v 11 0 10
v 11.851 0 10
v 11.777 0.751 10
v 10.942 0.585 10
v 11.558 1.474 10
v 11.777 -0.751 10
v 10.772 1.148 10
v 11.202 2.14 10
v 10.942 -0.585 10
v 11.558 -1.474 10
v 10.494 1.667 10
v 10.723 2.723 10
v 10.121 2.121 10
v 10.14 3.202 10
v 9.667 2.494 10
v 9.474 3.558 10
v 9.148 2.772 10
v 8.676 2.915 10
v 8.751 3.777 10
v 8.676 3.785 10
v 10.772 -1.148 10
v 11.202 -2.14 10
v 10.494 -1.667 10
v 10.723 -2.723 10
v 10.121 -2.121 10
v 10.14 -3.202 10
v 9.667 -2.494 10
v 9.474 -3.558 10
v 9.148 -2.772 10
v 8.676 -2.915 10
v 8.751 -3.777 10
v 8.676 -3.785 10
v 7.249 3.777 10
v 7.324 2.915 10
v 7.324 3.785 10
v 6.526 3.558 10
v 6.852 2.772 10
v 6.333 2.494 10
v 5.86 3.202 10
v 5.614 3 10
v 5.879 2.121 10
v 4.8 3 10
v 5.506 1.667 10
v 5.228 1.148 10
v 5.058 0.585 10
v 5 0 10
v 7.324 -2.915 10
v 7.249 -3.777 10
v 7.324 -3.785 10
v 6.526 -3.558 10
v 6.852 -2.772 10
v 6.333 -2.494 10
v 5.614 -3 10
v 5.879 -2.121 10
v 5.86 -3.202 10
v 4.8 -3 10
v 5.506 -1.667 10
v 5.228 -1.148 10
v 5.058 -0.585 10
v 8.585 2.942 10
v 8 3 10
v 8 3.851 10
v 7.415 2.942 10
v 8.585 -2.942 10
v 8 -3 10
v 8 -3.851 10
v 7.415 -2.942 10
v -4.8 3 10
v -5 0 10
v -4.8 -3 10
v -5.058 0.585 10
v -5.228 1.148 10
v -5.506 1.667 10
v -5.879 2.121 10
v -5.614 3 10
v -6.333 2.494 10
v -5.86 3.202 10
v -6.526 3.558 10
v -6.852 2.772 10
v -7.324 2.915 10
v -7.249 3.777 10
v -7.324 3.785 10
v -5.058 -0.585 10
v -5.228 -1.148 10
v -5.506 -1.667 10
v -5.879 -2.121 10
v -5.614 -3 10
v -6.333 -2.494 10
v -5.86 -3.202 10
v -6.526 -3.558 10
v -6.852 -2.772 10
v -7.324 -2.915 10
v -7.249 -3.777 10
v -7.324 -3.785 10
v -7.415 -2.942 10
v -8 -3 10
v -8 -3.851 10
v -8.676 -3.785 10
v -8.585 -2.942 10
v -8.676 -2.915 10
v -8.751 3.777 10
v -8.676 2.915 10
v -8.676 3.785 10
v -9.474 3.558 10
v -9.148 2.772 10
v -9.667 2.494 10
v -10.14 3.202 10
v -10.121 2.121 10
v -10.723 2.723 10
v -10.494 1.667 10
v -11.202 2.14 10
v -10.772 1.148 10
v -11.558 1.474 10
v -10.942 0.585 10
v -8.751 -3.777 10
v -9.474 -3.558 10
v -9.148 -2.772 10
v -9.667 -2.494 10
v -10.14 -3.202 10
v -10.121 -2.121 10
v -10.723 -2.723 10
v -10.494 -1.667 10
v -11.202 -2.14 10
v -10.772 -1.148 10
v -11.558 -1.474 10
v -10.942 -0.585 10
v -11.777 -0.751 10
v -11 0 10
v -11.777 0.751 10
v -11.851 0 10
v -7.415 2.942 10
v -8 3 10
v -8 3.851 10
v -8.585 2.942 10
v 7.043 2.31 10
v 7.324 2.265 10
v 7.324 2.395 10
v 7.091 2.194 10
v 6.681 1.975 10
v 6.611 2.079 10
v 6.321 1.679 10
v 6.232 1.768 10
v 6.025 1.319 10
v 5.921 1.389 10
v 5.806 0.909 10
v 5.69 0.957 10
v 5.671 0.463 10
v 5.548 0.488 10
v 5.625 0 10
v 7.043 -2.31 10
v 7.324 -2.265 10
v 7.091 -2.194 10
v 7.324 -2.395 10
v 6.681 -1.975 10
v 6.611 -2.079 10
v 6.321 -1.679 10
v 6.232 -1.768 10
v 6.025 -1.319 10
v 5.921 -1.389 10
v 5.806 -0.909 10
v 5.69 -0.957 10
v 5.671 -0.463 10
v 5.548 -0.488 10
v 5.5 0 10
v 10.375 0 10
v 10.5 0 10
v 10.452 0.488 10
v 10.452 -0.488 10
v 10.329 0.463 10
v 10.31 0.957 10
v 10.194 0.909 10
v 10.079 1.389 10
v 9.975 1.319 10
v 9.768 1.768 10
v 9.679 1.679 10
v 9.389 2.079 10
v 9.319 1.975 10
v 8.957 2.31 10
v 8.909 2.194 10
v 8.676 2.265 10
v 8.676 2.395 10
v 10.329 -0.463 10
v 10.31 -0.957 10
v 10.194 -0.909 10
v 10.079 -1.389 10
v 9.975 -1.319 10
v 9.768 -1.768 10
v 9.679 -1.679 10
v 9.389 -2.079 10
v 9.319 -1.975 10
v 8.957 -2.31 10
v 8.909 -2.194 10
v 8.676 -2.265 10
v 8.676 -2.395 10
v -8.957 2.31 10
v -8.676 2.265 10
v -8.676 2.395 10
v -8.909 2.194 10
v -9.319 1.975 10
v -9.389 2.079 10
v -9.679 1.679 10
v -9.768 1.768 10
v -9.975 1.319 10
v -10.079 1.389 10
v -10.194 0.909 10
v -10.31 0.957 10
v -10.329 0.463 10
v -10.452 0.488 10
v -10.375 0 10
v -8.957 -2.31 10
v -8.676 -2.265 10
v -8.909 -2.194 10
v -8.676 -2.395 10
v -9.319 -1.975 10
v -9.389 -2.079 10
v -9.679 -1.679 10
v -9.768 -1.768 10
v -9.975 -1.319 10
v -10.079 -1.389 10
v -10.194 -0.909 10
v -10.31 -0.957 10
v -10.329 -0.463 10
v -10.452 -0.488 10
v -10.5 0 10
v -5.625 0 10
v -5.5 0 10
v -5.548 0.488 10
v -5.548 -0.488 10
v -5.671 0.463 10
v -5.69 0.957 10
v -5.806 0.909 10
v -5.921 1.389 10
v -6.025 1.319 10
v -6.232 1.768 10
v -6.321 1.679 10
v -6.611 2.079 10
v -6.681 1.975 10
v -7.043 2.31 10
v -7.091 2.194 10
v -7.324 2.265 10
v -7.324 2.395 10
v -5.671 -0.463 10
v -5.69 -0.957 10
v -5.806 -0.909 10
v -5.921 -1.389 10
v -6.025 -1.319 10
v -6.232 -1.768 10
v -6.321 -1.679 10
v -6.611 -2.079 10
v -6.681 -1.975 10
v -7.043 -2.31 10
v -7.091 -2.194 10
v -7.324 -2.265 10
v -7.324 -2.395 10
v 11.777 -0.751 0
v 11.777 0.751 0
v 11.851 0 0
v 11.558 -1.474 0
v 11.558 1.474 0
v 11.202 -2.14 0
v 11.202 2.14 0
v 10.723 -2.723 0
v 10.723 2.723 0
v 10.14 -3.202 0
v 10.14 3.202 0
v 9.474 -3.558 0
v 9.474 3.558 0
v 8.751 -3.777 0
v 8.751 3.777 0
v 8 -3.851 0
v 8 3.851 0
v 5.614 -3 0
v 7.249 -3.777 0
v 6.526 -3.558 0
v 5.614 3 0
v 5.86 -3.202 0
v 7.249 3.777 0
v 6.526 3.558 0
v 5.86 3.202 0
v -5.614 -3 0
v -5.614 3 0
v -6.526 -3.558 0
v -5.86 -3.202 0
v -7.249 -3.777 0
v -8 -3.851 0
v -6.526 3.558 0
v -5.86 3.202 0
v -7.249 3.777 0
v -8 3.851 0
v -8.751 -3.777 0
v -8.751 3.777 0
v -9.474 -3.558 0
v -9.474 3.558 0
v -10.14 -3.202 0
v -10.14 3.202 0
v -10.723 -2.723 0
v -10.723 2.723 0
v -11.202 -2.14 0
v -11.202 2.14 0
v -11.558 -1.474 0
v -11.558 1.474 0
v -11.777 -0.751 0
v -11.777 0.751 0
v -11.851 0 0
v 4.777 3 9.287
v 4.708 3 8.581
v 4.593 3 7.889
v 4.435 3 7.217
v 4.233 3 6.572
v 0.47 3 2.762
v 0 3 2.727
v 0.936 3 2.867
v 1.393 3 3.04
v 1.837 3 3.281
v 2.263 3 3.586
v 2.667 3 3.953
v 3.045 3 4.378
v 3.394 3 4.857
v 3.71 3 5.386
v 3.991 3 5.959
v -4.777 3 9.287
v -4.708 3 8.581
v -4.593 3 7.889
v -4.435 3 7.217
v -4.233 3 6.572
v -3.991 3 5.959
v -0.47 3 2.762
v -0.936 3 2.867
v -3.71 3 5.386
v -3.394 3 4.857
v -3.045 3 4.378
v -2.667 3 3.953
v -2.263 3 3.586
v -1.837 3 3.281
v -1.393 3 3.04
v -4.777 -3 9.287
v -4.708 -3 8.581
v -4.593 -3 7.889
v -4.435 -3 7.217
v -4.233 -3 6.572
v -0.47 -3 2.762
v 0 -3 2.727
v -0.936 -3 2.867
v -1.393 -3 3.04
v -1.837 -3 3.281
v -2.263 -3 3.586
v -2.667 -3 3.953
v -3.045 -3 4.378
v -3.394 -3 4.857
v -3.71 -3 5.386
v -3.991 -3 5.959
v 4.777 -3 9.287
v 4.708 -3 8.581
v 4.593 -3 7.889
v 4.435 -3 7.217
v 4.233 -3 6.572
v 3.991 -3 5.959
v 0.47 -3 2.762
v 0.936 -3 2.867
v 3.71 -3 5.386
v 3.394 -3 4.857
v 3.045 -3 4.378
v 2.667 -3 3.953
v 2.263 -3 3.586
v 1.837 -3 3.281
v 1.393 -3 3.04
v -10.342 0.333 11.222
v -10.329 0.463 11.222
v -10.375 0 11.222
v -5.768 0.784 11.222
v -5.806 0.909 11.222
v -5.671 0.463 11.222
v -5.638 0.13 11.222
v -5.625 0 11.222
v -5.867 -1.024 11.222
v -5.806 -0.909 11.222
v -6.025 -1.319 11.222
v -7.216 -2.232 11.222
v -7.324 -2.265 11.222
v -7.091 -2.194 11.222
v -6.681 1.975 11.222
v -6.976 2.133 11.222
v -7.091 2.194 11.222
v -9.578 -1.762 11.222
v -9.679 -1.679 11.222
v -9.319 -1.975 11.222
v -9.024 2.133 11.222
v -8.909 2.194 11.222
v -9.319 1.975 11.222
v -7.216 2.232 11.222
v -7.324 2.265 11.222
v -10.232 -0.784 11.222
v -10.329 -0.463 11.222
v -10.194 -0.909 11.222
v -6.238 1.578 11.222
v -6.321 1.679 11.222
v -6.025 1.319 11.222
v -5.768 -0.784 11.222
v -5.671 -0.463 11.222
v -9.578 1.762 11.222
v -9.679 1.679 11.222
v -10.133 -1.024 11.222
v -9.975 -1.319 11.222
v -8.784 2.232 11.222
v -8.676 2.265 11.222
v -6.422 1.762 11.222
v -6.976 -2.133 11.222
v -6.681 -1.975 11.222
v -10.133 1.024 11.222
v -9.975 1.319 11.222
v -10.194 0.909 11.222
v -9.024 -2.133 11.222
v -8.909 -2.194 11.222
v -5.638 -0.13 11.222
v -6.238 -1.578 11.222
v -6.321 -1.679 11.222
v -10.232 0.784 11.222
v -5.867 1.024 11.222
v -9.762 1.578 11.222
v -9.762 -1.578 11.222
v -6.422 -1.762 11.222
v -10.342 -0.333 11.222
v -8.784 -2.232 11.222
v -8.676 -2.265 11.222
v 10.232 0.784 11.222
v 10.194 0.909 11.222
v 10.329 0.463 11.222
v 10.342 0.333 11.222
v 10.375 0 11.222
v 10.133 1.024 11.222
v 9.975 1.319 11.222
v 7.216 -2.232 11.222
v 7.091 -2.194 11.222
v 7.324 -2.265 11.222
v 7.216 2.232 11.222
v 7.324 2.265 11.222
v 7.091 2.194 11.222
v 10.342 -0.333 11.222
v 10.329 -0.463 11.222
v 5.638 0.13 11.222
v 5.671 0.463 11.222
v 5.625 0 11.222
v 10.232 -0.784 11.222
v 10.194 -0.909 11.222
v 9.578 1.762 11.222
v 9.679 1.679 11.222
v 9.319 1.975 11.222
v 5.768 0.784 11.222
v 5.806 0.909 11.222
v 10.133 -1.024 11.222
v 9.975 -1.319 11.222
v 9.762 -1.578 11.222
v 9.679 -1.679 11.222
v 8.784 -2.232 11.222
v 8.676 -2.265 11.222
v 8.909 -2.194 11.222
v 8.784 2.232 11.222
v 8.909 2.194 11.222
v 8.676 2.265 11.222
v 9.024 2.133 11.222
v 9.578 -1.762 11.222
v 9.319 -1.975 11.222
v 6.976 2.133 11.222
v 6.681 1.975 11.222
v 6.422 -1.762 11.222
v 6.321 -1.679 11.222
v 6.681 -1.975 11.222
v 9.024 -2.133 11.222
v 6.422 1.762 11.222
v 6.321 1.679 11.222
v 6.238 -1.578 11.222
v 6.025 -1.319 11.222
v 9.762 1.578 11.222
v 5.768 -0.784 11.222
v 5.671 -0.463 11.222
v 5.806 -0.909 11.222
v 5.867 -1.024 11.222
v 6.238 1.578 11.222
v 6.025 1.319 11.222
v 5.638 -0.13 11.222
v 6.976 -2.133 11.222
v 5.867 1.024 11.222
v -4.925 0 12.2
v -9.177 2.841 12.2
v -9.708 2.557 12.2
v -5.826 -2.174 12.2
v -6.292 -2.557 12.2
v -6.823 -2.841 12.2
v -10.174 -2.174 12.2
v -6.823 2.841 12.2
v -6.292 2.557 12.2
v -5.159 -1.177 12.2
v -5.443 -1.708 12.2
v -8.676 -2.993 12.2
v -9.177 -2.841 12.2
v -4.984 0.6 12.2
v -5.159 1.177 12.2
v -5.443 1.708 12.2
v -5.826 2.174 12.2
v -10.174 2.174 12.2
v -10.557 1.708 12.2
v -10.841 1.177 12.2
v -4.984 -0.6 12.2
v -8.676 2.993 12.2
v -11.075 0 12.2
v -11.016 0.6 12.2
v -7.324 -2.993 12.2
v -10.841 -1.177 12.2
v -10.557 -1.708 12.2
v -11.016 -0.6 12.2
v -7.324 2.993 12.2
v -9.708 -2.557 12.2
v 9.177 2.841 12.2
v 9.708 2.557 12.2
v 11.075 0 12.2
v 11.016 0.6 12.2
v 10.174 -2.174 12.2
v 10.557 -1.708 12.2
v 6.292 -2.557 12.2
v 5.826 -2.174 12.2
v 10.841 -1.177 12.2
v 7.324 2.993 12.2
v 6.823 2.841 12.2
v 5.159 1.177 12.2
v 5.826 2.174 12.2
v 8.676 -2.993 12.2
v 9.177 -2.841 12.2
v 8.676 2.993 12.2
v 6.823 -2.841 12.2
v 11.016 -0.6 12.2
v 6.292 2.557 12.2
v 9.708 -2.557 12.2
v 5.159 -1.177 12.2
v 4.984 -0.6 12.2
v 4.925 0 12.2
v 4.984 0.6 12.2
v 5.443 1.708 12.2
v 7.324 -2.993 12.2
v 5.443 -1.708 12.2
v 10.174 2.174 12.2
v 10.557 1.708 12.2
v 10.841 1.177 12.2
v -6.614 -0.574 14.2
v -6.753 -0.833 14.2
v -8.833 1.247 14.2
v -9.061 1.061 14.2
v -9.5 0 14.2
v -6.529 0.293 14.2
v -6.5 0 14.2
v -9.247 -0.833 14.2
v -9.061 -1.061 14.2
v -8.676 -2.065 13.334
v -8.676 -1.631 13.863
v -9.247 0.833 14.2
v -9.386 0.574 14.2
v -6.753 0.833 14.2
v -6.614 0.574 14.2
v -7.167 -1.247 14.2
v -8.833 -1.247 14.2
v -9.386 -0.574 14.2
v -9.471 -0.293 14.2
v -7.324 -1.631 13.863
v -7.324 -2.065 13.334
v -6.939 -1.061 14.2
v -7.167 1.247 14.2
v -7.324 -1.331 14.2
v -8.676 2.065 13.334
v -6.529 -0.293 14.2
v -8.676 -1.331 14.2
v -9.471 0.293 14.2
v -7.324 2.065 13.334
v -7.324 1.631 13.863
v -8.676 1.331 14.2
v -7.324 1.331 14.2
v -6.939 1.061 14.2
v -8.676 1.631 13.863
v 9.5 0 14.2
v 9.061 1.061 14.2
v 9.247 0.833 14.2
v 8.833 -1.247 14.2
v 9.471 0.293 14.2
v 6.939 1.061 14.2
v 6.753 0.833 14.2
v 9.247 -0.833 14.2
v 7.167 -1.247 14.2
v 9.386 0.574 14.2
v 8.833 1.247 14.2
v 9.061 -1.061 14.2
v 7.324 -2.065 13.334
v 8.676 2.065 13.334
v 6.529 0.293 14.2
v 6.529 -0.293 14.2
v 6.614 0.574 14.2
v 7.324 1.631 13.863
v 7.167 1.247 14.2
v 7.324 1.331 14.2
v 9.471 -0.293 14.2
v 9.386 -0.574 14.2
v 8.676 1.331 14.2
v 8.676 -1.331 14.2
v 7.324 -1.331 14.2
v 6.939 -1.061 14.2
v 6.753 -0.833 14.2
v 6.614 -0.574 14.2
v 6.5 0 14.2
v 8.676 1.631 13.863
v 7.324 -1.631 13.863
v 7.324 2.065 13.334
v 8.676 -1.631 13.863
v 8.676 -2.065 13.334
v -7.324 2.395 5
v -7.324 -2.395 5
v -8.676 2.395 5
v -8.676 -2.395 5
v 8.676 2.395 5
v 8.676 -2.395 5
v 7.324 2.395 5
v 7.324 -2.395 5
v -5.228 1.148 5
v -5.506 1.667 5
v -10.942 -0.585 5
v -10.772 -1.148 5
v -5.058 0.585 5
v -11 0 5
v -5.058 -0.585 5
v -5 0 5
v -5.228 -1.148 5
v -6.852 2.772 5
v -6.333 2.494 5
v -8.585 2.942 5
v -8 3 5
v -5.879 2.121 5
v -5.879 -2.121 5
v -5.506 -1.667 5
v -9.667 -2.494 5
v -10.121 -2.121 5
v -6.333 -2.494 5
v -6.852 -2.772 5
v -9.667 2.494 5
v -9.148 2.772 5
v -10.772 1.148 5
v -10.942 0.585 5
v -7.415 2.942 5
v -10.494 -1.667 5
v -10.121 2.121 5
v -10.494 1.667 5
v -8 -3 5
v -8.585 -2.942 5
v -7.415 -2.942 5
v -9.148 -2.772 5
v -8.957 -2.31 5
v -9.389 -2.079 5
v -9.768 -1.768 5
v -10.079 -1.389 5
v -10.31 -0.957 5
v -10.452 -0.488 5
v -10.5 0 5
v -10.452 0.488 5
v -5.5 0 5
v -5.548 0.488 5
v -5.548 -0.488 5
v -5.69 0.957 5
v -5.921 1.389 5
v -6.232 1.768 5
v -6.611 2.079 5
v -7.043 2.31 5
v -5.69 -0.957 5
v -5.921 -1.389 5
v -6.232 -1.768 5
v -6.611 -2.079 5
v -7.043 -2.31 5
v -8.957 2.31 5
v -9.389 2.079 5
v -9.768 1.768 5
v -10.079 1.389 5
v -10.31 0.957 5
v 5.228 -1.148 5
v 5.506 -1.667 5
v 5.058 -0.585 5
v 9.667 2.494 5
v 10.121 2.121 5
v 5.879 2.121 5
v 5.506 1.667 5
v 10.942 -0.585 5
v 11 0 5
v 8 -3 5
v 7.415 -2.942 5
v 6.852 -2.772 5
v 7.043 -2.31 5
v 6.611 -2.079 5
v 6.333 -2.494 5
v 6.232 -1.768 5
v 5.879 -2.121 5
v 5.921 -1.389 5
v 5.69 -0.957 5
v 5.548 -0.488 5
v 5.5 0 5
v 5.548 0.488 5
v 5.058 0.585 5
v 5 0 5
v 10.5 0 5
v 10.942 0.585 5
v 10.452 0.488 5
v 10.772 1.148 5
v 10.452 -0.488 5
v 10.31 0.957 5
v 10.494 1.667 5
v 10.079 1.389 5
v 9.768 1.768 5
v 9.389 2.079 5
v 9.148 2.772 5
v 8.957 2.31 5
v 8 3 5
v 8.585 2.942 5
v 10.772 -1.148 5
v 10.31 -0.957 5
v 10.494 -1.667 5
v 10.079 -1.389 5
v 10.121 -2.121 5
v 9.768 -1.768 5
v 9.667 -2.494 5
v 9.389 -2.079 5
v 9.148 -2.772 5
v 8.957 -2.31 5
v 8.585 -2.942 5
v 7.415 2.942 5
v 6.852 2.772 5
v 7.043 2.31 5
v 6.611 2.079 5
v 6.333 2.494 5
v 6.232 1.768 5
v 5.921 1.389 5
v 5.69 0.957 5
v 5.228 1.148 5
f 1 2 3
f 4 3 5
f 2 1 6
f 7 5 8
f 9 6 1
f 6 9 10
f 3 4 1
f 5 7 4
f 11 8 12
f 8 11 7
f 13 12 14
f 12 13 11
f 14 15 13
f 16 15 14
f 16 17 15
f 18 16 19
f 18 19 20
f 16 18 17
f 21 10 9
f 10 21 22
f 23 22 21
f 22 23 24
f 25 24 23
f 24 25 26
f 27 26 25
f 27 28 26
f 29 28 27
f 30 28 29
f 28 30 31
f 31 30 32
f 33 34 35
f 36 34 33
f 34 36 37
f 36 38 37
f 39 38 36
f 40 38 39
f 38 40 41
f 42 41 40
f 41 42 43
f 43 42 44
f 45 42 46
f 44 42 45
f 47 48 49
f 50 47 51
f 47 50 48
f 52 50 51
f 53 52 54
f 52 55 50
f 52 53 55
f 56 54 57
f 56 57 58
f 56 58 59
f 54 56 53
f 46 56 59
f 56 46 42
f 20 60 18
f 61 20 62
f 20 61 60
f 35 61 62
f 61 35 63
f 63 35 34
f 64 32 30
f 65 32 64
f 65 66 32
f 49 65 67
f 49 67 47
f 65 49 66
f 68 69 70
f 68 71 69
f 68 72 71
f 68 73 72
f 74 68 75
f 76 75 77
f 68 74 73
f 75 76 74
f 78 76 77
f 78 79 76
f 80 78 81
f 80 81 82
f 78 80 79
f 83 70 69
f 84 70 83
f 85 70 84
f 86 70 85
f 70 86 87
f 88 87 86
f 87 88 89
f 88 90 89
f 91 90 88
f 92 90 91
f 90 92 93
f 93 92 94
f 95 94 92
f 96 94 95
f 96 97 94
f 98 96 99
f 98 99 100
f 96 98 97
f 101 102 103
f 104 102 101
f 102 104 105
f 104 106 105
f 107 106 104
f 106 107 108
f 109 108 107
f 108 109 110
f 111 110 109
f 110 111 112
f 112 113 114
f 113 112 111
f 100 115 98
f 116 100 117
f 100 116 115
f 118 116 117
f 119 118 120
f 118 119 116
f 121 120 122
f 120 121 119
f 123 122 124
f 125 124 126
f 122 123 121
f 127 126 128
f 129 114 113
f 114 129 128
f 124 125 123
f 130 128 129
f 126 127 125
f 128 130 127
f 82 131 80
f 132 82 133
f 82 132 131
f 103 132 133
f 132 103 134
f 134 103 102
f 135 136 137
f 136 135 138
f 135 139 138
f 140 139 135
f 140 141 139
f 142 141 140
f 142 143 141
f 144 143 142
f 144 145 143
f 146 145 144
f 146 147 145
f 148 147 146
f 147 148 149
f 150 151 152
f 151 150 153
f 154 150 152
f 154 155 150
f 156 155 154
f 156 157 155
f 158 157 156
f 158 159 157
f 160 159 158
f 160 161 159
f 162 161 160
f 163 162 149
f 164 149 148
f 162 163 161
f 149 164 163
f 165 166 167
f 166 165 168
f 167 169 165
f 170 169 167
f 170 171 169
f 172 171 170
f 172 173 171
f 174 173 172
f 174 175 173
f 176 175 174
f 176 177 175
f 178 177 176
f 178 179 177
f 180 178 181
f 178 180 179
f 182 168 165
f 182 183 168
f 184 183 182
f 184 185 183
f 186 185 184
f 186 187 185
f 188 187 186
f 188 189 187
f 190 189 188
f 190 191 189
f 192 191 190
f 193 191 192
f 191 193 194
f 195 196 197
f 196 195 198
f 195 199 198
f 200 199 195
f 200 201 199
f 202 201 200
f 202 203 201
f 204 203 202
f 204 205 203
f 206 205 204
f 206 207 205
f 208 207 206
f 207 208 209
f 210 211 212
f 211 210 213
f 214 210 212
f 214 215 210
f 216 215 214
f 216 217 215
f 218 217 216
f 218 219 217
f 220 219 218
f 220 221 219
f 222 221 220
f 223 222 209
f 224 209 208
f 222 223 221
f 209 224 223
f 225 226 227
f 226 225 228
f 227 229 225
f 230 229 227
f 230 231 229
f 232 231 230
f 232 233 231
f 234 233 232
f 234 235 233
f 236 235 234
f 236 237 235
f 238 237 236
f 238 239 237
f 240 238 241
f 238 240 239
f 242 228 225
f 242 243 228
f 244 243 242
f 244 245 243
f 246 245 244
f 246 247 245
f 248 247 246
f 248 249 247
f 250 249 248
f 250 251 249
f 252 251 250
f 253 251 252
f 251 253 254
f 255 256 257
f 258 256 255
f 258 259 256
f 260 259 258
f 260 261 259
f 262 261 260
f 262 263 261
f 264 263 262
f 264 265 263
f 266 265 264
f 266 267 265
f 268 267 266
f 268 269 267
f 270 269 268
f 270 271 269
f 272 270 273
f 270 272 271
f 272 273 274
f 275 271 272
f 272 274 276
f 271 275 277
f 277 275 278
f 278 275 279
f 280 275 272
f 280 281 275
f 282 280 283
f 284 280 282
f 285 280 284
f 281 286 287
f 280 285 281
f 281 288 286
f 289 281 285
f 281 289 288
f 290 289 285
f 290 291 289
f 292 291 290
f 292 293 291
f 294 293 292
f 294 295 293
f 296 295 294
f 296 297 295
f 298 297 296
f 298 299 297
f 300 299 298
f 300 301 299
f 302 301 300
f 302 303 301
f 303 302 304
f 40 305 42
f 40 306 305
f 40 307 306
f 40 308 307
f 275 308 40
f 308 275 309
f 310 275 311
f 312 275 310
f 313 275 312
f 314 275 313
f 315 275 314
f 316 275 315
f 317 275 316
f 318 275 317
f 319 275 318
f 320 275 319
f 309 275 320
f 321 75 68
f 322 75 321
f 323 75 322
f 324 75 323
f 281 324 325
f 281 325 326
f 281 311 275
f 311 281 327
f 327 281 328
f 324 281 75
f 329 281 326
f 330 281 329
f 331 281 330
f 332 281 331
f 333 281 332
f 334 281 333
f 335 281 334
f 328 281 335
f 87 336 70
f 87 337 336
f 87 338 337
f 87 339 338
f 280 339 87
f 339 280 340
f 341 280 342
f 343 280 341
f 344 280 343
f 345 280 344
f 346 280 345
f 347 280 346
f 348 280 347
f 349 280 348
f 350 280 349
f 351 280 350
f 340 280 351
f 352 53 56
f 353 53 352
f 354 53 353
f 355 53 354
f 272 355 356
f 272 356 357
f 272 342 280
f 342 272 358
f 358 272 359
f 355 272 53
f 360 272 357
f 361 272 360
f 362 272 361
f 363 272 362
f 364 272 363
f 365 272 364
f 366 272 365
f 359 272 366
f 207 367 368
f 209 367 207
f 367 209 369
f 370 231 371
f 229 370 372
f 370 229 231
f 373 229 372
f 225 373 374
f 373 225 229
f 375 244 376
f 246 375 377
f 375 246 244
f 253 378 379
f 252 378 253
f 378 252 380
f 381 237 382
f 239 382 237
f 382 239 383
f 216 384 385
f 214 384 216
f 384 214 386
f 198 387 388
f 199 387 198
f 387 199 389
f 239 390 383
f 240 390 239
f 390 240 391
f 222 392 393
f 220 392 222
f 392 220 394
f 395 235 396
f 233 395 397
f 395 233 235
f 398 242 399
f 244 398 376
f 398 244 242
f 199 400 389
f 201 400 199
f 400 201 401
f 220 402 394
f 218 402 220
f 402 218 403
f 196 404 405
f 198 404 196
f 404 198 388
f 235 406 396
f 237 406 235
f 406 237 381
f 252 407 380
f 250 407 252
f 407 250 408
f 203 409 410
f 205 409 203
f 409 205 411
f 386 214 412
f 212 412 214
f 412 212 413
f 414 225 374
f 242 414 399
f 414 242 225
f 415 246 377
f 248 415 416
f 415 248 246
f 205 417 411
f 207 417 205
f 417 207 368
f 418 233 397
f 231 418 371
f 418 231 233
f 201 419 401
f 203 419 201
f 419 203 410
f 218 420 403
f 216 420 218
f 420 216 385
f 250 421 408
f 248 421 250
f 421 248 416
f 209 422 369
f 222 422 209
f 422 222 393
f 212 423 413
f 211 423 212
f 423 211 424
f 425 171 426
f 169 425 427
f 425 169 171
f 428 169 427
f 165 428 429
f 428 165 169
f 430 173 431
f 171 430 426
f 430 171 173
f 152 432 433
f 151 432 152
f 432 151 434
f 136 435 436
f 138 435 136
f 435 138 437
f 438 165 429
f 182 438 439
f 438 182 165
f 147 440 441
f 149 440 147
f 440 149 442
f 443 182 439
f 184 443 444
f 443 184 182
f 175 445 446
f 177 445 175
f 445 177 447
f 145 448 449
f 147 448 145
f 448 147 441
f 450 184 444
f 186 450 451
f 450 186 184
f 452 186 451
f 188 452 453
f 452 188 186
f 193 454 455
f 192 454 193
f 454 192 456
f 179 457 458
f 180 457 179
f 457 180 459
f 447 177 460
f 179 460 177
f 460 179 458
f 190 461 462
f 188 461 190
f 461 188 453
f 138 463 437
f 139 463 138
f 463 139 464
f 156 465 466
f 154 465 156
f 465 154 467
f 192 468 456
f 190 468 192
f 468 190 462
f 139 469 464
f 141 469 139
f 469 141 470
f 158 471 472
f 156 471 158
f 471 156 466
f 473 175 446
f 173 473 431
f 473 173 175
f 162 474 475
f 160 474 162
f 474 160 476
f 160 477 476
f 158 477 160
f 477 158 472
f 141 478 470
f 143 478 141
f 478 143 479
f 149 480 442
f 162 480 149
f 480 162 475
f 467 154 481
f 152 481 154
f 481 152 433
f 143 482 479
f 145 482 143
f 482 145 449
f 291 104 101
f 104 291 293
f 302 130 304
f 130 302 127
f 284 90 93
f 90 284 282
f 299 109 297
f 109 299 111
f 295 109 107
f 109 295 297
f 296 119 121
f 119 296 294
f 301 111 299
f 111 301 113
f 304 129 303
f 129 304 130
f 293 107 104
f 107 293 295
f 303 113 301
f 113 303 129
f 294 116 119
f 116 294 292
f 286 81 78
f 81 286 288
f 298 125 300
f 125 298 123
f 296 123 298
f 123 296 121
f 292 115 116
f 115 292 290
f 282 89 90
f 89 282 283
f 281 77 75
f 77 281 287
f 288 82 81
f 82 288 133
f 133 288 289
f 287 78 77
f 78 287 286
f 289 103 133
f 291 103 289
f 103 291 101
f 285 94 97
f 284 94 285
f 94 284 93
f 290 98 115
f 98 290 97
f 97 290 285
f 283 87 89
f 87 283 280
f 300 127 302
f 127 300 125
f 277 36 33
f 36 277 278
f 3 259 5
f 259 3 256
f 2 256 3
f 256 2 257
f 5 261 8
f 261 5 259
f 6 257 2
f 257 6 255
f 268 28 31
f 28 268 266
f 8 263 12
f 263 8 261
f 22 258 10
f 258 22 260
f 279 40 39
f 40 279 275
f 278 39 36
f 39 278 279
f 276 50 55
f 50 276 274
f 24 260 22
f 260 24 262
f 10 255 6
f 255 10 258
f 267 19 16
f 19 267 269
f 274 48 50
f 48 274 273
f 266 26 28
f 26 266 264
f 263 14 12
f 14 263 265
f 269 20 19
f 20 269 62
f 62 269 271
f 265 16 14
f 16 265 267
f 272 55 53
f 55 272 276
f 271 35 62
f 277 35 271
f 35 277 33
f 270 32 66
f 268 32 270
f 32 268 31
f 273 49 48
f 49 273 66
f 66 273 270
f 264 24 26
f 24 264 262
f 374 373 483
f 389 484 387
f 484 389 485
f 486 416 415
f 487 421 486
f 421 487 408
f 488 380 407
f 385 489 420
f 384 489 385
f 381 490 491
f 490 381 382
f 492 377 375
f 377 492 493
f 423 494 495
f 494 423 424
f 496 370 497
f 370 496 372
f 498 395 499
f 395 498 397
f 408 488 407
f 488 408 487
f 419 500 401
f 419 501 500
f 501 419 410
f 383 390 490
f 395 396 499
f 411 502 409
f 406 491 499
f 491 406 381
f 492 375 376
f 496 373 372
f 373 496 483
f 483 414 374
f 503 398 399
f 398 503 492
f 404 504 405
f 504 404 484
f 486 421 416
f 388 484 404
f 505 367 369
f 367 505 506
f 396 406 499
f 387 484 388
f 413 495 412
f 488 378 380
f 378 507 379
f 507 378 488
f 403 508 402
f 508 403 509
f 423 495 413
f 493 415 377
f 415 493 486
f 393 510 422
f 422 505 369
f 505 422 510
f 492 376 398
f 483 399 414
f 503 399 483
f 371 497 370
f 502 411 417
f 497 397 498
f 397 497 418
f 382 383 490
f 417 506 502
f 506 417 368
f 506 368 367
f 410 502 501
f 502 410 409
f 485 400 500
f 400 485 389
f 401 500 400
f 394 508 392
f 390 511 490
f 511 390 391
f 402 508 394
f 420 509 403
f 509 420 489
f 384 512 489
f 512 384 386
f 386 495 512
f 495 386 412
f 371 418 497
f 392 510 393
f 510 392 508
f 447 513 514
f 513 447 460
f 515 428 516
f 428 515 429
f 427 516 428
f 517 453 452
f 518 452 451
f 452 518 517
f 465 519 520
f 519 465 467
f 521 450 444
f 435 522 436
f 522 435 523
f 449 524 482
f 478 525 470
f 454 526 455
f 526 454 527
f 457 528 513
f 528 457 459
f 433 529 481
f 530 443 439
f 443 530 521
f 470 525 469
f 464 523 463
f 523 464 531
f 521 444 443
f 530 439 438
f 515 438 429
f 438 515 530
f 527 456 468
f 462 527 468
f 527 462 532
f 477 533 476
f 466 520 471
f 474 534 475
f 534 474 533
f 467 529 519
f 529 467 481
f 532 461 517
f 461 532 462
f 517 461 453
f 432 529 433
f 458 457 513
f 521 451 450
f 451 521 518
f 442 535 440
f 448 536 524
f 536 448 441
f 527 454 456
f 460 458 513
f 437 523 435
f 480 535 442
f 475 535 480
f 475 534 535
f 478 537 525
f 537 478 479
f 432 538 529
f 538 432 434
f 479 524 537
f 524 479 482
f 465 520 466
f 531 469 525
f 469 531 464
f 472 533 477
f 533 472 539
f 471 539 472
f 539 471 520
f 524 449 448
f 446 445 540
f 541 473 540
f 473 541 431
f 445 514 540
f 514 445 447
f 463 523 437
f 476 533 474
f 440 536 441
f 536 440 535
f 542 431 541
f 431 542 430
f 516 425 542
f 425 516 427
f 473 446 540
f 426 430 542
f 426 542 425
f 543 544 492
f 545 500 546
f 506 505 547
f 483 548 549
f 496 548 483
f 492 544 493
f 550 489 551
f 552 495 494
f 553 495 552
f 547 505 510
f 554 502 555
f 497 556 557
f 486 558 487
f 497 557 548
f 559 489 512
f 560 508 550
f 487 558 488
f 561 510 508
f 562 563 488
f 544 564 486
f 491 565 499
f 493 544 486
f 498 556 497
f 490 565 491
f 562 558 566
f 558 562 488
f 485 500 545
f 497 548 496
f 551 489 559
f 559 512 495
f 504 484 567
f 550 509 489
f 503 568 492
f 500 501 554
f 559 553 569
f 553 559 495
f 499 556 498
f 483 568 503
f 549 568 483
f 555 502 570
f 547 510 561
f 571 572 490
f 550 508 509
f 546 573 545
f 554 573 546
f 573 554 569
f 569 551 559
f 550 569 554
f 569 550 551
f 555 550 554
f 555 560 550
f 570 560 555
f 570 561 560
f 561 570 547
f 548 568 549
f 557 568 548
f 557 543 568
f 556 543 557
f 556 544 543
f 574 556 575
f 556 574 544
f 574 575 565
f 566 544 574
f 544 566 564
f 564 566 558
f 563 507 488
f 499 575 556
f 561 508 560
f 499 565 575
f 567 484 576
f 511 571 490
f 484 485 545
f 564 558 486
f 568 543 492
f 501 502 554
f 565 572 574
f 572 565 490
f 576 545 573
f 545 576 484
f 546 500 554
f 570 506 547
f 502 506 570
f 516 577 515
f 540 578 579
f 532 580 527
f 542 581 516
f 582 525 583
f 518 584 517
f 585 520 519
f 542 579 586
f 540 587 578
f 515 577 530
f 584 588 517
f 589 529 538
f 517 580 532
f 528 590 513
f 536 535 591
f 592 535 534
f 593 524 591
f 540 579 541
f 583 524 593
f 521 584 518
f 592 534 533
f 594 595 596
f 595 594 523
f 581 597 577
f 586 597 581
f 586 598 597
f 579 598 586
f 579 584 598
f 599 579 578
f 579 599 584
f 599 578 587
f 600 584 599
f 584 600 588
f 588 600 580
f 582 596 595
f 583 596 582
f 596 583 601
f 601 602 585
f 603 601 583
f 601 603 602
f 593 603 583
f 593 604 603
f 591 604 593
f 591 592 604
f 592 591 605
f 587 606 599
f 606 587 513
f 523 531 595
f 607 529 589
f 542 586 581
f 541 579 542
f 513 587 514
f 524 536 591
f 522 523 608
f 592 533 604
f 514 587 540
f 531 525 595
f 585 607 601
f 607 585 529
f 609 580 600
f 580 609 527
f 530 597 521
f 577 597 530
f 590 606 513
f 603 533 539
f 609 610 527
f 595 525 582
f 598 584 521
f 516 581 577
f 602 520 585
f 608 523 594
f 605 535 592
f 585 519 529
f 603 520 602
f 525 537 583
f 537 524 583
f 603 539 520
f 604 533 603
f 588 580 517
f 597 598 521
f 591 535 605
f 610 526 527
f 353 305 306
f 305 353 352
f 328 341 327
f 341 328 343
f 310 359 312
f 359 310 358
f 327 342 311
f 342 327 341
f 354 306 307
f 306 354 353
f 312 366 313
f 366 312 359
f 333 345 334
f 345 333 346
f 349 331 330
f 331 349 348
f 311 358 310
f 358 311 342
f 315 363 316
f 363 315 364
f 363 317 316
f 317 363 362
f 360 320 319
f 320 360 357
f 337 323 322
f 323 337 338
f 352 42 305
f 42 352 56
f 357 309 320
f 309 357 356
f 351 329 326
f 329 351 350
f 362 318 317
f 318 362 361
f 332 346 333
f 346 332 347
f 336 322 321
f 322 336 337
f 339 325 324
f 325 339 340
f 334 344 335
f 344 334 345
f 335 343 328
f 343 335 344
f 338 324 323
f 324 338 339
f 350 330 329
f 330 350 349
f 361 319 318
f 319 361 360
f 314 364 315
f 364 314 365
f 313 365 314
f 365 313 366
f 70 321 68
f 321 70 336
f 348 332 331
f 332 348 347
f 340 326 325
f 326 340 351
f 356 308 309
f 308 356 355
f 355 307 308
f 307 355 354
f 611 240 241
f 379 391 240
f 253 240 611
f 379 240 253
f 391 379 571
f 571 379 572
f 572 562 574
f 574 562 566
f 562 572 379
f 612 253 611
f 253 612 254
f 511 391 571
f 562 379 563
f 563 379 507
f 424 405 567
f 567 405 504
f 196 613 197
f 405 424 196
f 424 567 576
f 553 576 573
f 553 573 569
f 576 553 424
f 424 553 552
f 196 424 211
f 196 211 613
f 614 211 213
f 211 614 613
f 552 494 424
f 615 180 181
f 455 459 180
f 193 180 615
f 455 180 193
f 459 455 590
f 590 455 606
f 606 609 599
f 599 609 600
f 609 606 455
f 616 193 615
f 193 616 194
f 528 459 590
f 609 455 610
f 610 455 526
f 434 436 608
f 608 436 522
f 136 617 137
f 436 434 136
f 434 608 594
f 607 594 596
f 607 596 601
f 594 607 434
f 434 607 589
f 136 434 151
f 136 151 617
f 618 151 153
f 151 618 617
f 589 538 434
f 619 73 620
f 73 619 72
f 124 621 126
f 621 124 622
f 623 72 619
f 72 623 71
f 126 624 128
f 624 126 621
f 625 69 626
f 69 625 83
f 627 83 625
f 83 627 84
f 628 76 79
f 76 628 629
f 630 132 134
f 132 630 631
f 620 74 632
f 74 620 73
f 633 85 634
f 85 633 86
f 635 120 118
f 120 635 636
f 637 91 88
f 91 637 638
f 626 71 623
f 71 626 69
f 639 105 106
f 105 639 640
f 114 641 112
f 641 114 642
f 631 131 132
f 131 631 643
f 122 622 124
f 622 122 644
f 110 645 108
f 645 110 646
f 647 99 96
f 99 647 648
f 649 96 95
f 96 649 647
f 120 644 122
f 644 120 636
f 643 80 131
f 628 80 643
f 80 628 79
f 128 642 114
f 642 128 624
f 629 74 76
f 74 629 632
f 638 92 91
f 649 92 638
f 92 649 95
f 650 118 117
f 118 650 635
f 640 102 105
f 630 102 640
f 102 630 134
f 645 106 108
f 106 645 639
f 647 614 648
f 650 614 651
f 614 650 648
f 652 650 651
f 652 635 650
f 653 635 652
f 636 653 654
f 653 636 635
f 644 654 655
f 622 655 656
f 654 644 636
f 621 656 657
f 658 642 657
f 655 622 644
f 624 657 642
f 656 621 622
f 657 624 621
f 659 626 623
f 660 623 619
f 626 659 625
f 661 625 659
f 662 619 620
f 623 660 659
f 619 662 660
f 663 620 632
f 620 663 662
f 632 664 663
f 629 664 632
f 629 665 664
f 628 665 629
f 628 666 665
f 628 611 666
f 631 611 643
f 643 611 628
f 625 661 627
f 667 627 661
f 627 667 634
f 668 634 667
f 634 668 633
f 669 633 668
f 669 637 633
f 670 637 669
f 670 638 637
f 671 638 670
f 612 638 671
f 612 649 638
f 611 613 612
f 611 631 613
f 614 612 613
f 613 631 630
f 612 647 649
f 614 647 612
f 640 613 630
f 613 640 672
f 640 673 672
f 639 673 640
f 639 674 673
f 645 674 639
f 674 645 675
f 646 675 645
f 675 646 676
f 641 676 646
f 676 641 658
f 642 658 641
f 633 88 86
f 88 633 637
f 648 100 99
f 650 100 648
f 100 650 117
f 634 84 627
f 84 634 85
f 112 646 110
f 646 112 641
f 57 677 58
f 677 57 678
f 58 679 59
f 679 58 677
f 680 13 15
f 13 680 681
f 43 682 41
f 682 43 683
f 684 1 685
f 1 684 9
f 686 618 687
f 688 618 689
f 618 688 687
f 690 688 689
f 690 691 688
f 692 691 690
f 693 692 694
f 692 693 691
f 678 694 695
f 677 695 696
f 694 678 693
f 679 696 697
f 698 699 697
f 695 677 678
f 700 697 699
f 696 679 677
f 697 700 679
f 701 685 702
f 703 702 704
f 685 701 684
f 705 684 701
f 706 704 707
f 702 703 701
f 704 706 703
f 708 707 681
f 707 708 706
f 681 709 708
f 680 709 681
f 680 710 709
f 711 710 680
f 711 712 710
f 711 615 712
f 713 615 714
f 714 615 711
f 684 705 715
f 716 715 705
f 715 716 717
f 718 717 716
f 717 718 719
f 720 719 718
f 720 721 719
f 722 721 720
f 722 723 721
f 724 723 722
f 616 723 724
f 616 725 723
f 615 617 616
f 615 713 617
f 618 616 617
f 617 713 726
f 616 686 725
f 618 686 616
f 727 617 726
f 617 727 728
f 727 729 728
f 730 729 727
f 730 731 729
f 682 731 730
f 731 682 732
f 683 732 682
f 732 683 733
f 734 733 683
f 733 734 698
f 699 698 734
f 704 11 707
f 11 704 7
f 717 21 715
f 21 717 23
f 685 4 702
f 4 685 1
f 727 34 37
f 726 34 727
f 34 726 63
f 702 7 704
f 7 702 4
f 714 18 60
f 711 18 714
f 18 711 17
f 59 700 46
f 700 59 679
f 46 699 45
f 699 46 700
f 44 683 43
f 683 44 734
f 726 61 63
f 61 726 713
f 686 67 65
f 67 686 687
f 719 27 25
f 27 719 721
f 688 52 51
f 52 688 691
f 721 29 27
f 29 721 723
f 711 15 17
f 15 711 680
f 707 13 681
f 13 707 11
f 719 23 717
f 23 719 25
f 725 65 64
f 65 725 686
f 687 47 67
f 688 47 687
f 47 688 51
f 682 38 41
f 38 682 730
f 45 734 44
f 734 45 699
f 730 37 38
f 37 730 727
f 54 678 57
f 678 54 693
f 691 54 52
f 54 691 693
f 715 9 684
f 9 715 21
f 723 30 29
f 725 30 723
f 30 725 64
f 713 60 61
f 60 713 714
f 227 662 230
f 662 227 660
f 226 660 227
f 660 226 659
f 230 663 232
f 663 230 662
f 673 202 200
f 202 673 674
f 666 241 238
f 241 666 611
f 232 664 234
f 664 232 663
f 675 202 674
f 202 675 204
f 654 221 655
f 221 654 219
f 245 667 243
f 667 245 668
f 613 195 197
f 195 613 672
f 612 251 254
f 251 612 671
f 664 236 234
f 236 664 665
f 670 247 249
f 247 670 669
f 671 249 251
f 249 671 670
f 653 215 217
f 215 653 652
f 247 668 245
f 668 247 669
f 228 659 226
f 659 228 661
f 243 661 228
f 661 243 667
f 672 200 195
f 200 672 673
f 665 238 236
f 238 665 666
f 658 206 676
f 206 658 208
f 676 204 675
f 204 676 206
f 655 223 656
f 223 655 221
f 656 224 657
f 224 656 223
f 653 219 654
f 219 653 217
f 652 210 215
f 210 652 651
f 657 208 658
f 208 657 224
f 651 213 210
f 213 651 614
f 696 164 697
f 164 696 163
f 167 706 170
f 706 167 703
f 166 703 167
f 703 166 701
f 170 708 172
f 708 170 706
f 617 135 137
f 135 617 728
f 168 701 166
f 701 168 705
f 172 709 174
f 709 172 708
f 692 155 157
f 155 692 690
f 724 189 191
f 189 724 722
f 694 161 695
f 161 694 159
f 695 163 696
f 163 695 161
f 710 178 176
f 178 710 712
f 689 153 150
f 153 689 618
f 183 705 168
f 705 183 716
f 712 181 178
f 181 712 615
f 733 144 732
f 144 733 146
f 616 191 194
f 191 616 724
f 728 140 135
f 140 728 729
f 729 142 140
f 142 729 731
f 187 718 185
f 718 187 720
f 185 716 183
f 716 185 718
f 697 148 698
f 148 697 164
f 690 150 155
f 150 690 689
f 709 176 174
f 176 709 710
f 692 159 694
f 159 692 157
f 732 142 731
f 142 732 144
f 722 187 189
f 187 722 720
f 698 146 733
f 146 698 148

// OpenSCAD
//////////////////////////////////////////////
// Parametric Cable Clip for holed plates by Christoph Queck, chris@q3d.de, wwww.q3d.de
// April 2016
// Creative Commons Attribution-ShareAlike 4.0 International (CC BY-SA 4.0)
// http://creativecommons.org/licenses/by-sa/4.0/
/////////////////////////////////////////////

//Hole Distance in mm (I recommend skipping one hole)
Hole_Distance=16;

abstand = Hole_Distance;

//Hole Diameter in mm
Hole_Diameter=5;

loch=Hole_Diameter;

//Plate Thickness in mm
Thickness=2.2;

dicke=Thickness;

//Height in mm
Height=10;

hoehe=Height;

//Multiplier for fitting the Plugs
Fitting_multiplier=1;//[0:0.1:2]

fitting=(Fitting_multiplier/8)+0.9;
//Amount of clips
Amount=1;//[1, 4, 9]

///////////////////not yet implemented, stiffness multiplier
//Stiffness=1;

//stif=Stiffness;

if (Amount==1){
    clip();
    }
    
if (Amount==4){
    translate([(-abstand-loch*1.5-4)/2,(loch/1.5+2),0])clip();
    translate([-(-abstand-loch*1.5-4)/2,(loch/1.5+2),0])clip();
    translate([(-abstand-loch*1.5-4)/2,-(loch/1.5+2),0])clip();
    translate([-(-abstand-loch*1.5-4)/2,-(loch/1.5+2),0])clip();
    }

if (Amount==9){
    translate([0,(loch*1.2+4),0])clip();
    translate([0,0,0])clip();
    translate([0,-(loch*1.2+4),0])clip();
    
    translate([(-abstand-loch*1.5-4),(loch*1.2+4),0])clip();
    translate([(-abstand-loch*1.5-4),0,0])clip();
    translate([(-abstand-loch*1.5-4),-(loch*1.2+4),0])clip();
    
       translate([-(-abstand-loch*1.5-4),(loch*1.2+4),0])clip();
    translate([-(-abstand-loch*1.5-4),0,0])clip();
    translate([-(-abstand-loch*1.5-4),-(loch*1.2+4),0])clip();
    }


module clip(){
union(){
	difference(){
		union(){
			//body
			translate([0,0,hoehe/2])cube([abstand+2,loch*6/5,hoehe],center=true); 
			//stiftedurch
			translate([-abstand/2,0,hoehe])cylinder(r=loch/2*0.95,h=dicke*2,center=true,$fn=32);
			translate([abstand/2,0,hoehe])cylinder(r=loch/2*0.95,h=dicke*2,center=true,$fn=32);
			//stuetze
			translate([-abstand/2,0,hoehe/2])cylinder(r=(loch/2+loch/3.7),h=hoehe,center=true,$fn=32);
			translate([abstand/2,0,hoehe/2])cylinder(r=(loch/2+loch/3.7),h=hoehe,center=true,$fn=32);
			//schraegeunten
			translate([-abstand/2,0,hoehe+dicke*0.5])cylinder(r1=loch/2-loch/5,r2=loch/5*3*fitting,h=dicke,center=true,$fn=32);
			translate([abstand/2,0,hoehe+dicke*0.5])cylinder(r1=loch/2-loch/5,r2=loch/5*3*fitting,h=dicke,center=true,$fn=32);
			//schraegeoben
			translate([-abstand/2,0,hoehe+(dicke+1)])cylinder(r1=loch/5*3*fitting,r2=loch/2-loch/5,h=2,center=true,$fn=32);
			translate([abstand/2,0,hoehe+(dicke+1)])cylinder(r1=loch/5*3*fitting,r2=loch/2-loch/5,h=2,center=true,$fn=32);

		}
		union(){
			//kabelausschnitt
			difference(){
				translate([0,0,hoehe])scale([1,1,hoehe/10+(1-abstand/33)])rotate([90,0,0])cylinder(r=abstand/3.3333333,h=loch*2,$fn=64,center=true);
				translate([-abstand/2,0,hoehe/2])cylinder(r=loch/2,h=hoehe+1,center=true,$fn=32);
				translate([abstand/2,0,hoehe/2])cylinder(r=loch/2,h=hoehe+1,center=true,$fn=32);
				translate([-abstand/2,-loch/2,hoehe+0.1])cube([abstand,loch,hoehe]);
			}
			//clip ausschnitt
			translate([-abstand/2,0,hoehe+dicke*5])cube([loch/3.7,loch*2,dicke*10],center=true);
			translate([abstand/2,0,hoehe+dicke*5])cube([loch/3.7,loch*2,dicke*10],center=true);
			//clip verlaengerung
			union(){
				intersection(){
					union(){
						translate([-abstand/2,0,hoehe-loch*1])cube([loch/3.7,loch*2,loch*10],center=true);
						translate([abstand/2,0,hoehe-loch*1])cube([loch/3.7,loch*2,loch*10],center=true);
					}
					union(){              
						translate([-abstand/2,0,hoehe-loch/2])cylinder(r=loch/5*3,h=loch,center=true,$fn=32);
						translate([abstand/2,0,hoehe-loch/2])cylinder(r=loch/5*3,h=loch,center=true,$fn=32);
					}
				}
				difference(){
					union(){
						translate([-abstand/2,0,hoehe-loch/2])cylinder(r=loch/5*3,h=loch,center=true,$fn=32);
						translate([abstand/2,0,hoehe-loch/2])cylinder(r=loch/5*3,h=loch,center=true,$fn=32);
					}
					union(){
						translate([-abstand/2,0,hoehe-loch/2])cylinder(r=loch/2,h=loch,center=true,$fn=32);
						translate([abstand/2,0,hoehe-loch/2])cylinder(r=loch/2,h=loch,center=true,$fn=32);

					}
				}
			}          
		}
	}
	//brueckeunten
	translate([0,0,1])cube([abstand+2,loch*6/5,2],center=true);
}
}
